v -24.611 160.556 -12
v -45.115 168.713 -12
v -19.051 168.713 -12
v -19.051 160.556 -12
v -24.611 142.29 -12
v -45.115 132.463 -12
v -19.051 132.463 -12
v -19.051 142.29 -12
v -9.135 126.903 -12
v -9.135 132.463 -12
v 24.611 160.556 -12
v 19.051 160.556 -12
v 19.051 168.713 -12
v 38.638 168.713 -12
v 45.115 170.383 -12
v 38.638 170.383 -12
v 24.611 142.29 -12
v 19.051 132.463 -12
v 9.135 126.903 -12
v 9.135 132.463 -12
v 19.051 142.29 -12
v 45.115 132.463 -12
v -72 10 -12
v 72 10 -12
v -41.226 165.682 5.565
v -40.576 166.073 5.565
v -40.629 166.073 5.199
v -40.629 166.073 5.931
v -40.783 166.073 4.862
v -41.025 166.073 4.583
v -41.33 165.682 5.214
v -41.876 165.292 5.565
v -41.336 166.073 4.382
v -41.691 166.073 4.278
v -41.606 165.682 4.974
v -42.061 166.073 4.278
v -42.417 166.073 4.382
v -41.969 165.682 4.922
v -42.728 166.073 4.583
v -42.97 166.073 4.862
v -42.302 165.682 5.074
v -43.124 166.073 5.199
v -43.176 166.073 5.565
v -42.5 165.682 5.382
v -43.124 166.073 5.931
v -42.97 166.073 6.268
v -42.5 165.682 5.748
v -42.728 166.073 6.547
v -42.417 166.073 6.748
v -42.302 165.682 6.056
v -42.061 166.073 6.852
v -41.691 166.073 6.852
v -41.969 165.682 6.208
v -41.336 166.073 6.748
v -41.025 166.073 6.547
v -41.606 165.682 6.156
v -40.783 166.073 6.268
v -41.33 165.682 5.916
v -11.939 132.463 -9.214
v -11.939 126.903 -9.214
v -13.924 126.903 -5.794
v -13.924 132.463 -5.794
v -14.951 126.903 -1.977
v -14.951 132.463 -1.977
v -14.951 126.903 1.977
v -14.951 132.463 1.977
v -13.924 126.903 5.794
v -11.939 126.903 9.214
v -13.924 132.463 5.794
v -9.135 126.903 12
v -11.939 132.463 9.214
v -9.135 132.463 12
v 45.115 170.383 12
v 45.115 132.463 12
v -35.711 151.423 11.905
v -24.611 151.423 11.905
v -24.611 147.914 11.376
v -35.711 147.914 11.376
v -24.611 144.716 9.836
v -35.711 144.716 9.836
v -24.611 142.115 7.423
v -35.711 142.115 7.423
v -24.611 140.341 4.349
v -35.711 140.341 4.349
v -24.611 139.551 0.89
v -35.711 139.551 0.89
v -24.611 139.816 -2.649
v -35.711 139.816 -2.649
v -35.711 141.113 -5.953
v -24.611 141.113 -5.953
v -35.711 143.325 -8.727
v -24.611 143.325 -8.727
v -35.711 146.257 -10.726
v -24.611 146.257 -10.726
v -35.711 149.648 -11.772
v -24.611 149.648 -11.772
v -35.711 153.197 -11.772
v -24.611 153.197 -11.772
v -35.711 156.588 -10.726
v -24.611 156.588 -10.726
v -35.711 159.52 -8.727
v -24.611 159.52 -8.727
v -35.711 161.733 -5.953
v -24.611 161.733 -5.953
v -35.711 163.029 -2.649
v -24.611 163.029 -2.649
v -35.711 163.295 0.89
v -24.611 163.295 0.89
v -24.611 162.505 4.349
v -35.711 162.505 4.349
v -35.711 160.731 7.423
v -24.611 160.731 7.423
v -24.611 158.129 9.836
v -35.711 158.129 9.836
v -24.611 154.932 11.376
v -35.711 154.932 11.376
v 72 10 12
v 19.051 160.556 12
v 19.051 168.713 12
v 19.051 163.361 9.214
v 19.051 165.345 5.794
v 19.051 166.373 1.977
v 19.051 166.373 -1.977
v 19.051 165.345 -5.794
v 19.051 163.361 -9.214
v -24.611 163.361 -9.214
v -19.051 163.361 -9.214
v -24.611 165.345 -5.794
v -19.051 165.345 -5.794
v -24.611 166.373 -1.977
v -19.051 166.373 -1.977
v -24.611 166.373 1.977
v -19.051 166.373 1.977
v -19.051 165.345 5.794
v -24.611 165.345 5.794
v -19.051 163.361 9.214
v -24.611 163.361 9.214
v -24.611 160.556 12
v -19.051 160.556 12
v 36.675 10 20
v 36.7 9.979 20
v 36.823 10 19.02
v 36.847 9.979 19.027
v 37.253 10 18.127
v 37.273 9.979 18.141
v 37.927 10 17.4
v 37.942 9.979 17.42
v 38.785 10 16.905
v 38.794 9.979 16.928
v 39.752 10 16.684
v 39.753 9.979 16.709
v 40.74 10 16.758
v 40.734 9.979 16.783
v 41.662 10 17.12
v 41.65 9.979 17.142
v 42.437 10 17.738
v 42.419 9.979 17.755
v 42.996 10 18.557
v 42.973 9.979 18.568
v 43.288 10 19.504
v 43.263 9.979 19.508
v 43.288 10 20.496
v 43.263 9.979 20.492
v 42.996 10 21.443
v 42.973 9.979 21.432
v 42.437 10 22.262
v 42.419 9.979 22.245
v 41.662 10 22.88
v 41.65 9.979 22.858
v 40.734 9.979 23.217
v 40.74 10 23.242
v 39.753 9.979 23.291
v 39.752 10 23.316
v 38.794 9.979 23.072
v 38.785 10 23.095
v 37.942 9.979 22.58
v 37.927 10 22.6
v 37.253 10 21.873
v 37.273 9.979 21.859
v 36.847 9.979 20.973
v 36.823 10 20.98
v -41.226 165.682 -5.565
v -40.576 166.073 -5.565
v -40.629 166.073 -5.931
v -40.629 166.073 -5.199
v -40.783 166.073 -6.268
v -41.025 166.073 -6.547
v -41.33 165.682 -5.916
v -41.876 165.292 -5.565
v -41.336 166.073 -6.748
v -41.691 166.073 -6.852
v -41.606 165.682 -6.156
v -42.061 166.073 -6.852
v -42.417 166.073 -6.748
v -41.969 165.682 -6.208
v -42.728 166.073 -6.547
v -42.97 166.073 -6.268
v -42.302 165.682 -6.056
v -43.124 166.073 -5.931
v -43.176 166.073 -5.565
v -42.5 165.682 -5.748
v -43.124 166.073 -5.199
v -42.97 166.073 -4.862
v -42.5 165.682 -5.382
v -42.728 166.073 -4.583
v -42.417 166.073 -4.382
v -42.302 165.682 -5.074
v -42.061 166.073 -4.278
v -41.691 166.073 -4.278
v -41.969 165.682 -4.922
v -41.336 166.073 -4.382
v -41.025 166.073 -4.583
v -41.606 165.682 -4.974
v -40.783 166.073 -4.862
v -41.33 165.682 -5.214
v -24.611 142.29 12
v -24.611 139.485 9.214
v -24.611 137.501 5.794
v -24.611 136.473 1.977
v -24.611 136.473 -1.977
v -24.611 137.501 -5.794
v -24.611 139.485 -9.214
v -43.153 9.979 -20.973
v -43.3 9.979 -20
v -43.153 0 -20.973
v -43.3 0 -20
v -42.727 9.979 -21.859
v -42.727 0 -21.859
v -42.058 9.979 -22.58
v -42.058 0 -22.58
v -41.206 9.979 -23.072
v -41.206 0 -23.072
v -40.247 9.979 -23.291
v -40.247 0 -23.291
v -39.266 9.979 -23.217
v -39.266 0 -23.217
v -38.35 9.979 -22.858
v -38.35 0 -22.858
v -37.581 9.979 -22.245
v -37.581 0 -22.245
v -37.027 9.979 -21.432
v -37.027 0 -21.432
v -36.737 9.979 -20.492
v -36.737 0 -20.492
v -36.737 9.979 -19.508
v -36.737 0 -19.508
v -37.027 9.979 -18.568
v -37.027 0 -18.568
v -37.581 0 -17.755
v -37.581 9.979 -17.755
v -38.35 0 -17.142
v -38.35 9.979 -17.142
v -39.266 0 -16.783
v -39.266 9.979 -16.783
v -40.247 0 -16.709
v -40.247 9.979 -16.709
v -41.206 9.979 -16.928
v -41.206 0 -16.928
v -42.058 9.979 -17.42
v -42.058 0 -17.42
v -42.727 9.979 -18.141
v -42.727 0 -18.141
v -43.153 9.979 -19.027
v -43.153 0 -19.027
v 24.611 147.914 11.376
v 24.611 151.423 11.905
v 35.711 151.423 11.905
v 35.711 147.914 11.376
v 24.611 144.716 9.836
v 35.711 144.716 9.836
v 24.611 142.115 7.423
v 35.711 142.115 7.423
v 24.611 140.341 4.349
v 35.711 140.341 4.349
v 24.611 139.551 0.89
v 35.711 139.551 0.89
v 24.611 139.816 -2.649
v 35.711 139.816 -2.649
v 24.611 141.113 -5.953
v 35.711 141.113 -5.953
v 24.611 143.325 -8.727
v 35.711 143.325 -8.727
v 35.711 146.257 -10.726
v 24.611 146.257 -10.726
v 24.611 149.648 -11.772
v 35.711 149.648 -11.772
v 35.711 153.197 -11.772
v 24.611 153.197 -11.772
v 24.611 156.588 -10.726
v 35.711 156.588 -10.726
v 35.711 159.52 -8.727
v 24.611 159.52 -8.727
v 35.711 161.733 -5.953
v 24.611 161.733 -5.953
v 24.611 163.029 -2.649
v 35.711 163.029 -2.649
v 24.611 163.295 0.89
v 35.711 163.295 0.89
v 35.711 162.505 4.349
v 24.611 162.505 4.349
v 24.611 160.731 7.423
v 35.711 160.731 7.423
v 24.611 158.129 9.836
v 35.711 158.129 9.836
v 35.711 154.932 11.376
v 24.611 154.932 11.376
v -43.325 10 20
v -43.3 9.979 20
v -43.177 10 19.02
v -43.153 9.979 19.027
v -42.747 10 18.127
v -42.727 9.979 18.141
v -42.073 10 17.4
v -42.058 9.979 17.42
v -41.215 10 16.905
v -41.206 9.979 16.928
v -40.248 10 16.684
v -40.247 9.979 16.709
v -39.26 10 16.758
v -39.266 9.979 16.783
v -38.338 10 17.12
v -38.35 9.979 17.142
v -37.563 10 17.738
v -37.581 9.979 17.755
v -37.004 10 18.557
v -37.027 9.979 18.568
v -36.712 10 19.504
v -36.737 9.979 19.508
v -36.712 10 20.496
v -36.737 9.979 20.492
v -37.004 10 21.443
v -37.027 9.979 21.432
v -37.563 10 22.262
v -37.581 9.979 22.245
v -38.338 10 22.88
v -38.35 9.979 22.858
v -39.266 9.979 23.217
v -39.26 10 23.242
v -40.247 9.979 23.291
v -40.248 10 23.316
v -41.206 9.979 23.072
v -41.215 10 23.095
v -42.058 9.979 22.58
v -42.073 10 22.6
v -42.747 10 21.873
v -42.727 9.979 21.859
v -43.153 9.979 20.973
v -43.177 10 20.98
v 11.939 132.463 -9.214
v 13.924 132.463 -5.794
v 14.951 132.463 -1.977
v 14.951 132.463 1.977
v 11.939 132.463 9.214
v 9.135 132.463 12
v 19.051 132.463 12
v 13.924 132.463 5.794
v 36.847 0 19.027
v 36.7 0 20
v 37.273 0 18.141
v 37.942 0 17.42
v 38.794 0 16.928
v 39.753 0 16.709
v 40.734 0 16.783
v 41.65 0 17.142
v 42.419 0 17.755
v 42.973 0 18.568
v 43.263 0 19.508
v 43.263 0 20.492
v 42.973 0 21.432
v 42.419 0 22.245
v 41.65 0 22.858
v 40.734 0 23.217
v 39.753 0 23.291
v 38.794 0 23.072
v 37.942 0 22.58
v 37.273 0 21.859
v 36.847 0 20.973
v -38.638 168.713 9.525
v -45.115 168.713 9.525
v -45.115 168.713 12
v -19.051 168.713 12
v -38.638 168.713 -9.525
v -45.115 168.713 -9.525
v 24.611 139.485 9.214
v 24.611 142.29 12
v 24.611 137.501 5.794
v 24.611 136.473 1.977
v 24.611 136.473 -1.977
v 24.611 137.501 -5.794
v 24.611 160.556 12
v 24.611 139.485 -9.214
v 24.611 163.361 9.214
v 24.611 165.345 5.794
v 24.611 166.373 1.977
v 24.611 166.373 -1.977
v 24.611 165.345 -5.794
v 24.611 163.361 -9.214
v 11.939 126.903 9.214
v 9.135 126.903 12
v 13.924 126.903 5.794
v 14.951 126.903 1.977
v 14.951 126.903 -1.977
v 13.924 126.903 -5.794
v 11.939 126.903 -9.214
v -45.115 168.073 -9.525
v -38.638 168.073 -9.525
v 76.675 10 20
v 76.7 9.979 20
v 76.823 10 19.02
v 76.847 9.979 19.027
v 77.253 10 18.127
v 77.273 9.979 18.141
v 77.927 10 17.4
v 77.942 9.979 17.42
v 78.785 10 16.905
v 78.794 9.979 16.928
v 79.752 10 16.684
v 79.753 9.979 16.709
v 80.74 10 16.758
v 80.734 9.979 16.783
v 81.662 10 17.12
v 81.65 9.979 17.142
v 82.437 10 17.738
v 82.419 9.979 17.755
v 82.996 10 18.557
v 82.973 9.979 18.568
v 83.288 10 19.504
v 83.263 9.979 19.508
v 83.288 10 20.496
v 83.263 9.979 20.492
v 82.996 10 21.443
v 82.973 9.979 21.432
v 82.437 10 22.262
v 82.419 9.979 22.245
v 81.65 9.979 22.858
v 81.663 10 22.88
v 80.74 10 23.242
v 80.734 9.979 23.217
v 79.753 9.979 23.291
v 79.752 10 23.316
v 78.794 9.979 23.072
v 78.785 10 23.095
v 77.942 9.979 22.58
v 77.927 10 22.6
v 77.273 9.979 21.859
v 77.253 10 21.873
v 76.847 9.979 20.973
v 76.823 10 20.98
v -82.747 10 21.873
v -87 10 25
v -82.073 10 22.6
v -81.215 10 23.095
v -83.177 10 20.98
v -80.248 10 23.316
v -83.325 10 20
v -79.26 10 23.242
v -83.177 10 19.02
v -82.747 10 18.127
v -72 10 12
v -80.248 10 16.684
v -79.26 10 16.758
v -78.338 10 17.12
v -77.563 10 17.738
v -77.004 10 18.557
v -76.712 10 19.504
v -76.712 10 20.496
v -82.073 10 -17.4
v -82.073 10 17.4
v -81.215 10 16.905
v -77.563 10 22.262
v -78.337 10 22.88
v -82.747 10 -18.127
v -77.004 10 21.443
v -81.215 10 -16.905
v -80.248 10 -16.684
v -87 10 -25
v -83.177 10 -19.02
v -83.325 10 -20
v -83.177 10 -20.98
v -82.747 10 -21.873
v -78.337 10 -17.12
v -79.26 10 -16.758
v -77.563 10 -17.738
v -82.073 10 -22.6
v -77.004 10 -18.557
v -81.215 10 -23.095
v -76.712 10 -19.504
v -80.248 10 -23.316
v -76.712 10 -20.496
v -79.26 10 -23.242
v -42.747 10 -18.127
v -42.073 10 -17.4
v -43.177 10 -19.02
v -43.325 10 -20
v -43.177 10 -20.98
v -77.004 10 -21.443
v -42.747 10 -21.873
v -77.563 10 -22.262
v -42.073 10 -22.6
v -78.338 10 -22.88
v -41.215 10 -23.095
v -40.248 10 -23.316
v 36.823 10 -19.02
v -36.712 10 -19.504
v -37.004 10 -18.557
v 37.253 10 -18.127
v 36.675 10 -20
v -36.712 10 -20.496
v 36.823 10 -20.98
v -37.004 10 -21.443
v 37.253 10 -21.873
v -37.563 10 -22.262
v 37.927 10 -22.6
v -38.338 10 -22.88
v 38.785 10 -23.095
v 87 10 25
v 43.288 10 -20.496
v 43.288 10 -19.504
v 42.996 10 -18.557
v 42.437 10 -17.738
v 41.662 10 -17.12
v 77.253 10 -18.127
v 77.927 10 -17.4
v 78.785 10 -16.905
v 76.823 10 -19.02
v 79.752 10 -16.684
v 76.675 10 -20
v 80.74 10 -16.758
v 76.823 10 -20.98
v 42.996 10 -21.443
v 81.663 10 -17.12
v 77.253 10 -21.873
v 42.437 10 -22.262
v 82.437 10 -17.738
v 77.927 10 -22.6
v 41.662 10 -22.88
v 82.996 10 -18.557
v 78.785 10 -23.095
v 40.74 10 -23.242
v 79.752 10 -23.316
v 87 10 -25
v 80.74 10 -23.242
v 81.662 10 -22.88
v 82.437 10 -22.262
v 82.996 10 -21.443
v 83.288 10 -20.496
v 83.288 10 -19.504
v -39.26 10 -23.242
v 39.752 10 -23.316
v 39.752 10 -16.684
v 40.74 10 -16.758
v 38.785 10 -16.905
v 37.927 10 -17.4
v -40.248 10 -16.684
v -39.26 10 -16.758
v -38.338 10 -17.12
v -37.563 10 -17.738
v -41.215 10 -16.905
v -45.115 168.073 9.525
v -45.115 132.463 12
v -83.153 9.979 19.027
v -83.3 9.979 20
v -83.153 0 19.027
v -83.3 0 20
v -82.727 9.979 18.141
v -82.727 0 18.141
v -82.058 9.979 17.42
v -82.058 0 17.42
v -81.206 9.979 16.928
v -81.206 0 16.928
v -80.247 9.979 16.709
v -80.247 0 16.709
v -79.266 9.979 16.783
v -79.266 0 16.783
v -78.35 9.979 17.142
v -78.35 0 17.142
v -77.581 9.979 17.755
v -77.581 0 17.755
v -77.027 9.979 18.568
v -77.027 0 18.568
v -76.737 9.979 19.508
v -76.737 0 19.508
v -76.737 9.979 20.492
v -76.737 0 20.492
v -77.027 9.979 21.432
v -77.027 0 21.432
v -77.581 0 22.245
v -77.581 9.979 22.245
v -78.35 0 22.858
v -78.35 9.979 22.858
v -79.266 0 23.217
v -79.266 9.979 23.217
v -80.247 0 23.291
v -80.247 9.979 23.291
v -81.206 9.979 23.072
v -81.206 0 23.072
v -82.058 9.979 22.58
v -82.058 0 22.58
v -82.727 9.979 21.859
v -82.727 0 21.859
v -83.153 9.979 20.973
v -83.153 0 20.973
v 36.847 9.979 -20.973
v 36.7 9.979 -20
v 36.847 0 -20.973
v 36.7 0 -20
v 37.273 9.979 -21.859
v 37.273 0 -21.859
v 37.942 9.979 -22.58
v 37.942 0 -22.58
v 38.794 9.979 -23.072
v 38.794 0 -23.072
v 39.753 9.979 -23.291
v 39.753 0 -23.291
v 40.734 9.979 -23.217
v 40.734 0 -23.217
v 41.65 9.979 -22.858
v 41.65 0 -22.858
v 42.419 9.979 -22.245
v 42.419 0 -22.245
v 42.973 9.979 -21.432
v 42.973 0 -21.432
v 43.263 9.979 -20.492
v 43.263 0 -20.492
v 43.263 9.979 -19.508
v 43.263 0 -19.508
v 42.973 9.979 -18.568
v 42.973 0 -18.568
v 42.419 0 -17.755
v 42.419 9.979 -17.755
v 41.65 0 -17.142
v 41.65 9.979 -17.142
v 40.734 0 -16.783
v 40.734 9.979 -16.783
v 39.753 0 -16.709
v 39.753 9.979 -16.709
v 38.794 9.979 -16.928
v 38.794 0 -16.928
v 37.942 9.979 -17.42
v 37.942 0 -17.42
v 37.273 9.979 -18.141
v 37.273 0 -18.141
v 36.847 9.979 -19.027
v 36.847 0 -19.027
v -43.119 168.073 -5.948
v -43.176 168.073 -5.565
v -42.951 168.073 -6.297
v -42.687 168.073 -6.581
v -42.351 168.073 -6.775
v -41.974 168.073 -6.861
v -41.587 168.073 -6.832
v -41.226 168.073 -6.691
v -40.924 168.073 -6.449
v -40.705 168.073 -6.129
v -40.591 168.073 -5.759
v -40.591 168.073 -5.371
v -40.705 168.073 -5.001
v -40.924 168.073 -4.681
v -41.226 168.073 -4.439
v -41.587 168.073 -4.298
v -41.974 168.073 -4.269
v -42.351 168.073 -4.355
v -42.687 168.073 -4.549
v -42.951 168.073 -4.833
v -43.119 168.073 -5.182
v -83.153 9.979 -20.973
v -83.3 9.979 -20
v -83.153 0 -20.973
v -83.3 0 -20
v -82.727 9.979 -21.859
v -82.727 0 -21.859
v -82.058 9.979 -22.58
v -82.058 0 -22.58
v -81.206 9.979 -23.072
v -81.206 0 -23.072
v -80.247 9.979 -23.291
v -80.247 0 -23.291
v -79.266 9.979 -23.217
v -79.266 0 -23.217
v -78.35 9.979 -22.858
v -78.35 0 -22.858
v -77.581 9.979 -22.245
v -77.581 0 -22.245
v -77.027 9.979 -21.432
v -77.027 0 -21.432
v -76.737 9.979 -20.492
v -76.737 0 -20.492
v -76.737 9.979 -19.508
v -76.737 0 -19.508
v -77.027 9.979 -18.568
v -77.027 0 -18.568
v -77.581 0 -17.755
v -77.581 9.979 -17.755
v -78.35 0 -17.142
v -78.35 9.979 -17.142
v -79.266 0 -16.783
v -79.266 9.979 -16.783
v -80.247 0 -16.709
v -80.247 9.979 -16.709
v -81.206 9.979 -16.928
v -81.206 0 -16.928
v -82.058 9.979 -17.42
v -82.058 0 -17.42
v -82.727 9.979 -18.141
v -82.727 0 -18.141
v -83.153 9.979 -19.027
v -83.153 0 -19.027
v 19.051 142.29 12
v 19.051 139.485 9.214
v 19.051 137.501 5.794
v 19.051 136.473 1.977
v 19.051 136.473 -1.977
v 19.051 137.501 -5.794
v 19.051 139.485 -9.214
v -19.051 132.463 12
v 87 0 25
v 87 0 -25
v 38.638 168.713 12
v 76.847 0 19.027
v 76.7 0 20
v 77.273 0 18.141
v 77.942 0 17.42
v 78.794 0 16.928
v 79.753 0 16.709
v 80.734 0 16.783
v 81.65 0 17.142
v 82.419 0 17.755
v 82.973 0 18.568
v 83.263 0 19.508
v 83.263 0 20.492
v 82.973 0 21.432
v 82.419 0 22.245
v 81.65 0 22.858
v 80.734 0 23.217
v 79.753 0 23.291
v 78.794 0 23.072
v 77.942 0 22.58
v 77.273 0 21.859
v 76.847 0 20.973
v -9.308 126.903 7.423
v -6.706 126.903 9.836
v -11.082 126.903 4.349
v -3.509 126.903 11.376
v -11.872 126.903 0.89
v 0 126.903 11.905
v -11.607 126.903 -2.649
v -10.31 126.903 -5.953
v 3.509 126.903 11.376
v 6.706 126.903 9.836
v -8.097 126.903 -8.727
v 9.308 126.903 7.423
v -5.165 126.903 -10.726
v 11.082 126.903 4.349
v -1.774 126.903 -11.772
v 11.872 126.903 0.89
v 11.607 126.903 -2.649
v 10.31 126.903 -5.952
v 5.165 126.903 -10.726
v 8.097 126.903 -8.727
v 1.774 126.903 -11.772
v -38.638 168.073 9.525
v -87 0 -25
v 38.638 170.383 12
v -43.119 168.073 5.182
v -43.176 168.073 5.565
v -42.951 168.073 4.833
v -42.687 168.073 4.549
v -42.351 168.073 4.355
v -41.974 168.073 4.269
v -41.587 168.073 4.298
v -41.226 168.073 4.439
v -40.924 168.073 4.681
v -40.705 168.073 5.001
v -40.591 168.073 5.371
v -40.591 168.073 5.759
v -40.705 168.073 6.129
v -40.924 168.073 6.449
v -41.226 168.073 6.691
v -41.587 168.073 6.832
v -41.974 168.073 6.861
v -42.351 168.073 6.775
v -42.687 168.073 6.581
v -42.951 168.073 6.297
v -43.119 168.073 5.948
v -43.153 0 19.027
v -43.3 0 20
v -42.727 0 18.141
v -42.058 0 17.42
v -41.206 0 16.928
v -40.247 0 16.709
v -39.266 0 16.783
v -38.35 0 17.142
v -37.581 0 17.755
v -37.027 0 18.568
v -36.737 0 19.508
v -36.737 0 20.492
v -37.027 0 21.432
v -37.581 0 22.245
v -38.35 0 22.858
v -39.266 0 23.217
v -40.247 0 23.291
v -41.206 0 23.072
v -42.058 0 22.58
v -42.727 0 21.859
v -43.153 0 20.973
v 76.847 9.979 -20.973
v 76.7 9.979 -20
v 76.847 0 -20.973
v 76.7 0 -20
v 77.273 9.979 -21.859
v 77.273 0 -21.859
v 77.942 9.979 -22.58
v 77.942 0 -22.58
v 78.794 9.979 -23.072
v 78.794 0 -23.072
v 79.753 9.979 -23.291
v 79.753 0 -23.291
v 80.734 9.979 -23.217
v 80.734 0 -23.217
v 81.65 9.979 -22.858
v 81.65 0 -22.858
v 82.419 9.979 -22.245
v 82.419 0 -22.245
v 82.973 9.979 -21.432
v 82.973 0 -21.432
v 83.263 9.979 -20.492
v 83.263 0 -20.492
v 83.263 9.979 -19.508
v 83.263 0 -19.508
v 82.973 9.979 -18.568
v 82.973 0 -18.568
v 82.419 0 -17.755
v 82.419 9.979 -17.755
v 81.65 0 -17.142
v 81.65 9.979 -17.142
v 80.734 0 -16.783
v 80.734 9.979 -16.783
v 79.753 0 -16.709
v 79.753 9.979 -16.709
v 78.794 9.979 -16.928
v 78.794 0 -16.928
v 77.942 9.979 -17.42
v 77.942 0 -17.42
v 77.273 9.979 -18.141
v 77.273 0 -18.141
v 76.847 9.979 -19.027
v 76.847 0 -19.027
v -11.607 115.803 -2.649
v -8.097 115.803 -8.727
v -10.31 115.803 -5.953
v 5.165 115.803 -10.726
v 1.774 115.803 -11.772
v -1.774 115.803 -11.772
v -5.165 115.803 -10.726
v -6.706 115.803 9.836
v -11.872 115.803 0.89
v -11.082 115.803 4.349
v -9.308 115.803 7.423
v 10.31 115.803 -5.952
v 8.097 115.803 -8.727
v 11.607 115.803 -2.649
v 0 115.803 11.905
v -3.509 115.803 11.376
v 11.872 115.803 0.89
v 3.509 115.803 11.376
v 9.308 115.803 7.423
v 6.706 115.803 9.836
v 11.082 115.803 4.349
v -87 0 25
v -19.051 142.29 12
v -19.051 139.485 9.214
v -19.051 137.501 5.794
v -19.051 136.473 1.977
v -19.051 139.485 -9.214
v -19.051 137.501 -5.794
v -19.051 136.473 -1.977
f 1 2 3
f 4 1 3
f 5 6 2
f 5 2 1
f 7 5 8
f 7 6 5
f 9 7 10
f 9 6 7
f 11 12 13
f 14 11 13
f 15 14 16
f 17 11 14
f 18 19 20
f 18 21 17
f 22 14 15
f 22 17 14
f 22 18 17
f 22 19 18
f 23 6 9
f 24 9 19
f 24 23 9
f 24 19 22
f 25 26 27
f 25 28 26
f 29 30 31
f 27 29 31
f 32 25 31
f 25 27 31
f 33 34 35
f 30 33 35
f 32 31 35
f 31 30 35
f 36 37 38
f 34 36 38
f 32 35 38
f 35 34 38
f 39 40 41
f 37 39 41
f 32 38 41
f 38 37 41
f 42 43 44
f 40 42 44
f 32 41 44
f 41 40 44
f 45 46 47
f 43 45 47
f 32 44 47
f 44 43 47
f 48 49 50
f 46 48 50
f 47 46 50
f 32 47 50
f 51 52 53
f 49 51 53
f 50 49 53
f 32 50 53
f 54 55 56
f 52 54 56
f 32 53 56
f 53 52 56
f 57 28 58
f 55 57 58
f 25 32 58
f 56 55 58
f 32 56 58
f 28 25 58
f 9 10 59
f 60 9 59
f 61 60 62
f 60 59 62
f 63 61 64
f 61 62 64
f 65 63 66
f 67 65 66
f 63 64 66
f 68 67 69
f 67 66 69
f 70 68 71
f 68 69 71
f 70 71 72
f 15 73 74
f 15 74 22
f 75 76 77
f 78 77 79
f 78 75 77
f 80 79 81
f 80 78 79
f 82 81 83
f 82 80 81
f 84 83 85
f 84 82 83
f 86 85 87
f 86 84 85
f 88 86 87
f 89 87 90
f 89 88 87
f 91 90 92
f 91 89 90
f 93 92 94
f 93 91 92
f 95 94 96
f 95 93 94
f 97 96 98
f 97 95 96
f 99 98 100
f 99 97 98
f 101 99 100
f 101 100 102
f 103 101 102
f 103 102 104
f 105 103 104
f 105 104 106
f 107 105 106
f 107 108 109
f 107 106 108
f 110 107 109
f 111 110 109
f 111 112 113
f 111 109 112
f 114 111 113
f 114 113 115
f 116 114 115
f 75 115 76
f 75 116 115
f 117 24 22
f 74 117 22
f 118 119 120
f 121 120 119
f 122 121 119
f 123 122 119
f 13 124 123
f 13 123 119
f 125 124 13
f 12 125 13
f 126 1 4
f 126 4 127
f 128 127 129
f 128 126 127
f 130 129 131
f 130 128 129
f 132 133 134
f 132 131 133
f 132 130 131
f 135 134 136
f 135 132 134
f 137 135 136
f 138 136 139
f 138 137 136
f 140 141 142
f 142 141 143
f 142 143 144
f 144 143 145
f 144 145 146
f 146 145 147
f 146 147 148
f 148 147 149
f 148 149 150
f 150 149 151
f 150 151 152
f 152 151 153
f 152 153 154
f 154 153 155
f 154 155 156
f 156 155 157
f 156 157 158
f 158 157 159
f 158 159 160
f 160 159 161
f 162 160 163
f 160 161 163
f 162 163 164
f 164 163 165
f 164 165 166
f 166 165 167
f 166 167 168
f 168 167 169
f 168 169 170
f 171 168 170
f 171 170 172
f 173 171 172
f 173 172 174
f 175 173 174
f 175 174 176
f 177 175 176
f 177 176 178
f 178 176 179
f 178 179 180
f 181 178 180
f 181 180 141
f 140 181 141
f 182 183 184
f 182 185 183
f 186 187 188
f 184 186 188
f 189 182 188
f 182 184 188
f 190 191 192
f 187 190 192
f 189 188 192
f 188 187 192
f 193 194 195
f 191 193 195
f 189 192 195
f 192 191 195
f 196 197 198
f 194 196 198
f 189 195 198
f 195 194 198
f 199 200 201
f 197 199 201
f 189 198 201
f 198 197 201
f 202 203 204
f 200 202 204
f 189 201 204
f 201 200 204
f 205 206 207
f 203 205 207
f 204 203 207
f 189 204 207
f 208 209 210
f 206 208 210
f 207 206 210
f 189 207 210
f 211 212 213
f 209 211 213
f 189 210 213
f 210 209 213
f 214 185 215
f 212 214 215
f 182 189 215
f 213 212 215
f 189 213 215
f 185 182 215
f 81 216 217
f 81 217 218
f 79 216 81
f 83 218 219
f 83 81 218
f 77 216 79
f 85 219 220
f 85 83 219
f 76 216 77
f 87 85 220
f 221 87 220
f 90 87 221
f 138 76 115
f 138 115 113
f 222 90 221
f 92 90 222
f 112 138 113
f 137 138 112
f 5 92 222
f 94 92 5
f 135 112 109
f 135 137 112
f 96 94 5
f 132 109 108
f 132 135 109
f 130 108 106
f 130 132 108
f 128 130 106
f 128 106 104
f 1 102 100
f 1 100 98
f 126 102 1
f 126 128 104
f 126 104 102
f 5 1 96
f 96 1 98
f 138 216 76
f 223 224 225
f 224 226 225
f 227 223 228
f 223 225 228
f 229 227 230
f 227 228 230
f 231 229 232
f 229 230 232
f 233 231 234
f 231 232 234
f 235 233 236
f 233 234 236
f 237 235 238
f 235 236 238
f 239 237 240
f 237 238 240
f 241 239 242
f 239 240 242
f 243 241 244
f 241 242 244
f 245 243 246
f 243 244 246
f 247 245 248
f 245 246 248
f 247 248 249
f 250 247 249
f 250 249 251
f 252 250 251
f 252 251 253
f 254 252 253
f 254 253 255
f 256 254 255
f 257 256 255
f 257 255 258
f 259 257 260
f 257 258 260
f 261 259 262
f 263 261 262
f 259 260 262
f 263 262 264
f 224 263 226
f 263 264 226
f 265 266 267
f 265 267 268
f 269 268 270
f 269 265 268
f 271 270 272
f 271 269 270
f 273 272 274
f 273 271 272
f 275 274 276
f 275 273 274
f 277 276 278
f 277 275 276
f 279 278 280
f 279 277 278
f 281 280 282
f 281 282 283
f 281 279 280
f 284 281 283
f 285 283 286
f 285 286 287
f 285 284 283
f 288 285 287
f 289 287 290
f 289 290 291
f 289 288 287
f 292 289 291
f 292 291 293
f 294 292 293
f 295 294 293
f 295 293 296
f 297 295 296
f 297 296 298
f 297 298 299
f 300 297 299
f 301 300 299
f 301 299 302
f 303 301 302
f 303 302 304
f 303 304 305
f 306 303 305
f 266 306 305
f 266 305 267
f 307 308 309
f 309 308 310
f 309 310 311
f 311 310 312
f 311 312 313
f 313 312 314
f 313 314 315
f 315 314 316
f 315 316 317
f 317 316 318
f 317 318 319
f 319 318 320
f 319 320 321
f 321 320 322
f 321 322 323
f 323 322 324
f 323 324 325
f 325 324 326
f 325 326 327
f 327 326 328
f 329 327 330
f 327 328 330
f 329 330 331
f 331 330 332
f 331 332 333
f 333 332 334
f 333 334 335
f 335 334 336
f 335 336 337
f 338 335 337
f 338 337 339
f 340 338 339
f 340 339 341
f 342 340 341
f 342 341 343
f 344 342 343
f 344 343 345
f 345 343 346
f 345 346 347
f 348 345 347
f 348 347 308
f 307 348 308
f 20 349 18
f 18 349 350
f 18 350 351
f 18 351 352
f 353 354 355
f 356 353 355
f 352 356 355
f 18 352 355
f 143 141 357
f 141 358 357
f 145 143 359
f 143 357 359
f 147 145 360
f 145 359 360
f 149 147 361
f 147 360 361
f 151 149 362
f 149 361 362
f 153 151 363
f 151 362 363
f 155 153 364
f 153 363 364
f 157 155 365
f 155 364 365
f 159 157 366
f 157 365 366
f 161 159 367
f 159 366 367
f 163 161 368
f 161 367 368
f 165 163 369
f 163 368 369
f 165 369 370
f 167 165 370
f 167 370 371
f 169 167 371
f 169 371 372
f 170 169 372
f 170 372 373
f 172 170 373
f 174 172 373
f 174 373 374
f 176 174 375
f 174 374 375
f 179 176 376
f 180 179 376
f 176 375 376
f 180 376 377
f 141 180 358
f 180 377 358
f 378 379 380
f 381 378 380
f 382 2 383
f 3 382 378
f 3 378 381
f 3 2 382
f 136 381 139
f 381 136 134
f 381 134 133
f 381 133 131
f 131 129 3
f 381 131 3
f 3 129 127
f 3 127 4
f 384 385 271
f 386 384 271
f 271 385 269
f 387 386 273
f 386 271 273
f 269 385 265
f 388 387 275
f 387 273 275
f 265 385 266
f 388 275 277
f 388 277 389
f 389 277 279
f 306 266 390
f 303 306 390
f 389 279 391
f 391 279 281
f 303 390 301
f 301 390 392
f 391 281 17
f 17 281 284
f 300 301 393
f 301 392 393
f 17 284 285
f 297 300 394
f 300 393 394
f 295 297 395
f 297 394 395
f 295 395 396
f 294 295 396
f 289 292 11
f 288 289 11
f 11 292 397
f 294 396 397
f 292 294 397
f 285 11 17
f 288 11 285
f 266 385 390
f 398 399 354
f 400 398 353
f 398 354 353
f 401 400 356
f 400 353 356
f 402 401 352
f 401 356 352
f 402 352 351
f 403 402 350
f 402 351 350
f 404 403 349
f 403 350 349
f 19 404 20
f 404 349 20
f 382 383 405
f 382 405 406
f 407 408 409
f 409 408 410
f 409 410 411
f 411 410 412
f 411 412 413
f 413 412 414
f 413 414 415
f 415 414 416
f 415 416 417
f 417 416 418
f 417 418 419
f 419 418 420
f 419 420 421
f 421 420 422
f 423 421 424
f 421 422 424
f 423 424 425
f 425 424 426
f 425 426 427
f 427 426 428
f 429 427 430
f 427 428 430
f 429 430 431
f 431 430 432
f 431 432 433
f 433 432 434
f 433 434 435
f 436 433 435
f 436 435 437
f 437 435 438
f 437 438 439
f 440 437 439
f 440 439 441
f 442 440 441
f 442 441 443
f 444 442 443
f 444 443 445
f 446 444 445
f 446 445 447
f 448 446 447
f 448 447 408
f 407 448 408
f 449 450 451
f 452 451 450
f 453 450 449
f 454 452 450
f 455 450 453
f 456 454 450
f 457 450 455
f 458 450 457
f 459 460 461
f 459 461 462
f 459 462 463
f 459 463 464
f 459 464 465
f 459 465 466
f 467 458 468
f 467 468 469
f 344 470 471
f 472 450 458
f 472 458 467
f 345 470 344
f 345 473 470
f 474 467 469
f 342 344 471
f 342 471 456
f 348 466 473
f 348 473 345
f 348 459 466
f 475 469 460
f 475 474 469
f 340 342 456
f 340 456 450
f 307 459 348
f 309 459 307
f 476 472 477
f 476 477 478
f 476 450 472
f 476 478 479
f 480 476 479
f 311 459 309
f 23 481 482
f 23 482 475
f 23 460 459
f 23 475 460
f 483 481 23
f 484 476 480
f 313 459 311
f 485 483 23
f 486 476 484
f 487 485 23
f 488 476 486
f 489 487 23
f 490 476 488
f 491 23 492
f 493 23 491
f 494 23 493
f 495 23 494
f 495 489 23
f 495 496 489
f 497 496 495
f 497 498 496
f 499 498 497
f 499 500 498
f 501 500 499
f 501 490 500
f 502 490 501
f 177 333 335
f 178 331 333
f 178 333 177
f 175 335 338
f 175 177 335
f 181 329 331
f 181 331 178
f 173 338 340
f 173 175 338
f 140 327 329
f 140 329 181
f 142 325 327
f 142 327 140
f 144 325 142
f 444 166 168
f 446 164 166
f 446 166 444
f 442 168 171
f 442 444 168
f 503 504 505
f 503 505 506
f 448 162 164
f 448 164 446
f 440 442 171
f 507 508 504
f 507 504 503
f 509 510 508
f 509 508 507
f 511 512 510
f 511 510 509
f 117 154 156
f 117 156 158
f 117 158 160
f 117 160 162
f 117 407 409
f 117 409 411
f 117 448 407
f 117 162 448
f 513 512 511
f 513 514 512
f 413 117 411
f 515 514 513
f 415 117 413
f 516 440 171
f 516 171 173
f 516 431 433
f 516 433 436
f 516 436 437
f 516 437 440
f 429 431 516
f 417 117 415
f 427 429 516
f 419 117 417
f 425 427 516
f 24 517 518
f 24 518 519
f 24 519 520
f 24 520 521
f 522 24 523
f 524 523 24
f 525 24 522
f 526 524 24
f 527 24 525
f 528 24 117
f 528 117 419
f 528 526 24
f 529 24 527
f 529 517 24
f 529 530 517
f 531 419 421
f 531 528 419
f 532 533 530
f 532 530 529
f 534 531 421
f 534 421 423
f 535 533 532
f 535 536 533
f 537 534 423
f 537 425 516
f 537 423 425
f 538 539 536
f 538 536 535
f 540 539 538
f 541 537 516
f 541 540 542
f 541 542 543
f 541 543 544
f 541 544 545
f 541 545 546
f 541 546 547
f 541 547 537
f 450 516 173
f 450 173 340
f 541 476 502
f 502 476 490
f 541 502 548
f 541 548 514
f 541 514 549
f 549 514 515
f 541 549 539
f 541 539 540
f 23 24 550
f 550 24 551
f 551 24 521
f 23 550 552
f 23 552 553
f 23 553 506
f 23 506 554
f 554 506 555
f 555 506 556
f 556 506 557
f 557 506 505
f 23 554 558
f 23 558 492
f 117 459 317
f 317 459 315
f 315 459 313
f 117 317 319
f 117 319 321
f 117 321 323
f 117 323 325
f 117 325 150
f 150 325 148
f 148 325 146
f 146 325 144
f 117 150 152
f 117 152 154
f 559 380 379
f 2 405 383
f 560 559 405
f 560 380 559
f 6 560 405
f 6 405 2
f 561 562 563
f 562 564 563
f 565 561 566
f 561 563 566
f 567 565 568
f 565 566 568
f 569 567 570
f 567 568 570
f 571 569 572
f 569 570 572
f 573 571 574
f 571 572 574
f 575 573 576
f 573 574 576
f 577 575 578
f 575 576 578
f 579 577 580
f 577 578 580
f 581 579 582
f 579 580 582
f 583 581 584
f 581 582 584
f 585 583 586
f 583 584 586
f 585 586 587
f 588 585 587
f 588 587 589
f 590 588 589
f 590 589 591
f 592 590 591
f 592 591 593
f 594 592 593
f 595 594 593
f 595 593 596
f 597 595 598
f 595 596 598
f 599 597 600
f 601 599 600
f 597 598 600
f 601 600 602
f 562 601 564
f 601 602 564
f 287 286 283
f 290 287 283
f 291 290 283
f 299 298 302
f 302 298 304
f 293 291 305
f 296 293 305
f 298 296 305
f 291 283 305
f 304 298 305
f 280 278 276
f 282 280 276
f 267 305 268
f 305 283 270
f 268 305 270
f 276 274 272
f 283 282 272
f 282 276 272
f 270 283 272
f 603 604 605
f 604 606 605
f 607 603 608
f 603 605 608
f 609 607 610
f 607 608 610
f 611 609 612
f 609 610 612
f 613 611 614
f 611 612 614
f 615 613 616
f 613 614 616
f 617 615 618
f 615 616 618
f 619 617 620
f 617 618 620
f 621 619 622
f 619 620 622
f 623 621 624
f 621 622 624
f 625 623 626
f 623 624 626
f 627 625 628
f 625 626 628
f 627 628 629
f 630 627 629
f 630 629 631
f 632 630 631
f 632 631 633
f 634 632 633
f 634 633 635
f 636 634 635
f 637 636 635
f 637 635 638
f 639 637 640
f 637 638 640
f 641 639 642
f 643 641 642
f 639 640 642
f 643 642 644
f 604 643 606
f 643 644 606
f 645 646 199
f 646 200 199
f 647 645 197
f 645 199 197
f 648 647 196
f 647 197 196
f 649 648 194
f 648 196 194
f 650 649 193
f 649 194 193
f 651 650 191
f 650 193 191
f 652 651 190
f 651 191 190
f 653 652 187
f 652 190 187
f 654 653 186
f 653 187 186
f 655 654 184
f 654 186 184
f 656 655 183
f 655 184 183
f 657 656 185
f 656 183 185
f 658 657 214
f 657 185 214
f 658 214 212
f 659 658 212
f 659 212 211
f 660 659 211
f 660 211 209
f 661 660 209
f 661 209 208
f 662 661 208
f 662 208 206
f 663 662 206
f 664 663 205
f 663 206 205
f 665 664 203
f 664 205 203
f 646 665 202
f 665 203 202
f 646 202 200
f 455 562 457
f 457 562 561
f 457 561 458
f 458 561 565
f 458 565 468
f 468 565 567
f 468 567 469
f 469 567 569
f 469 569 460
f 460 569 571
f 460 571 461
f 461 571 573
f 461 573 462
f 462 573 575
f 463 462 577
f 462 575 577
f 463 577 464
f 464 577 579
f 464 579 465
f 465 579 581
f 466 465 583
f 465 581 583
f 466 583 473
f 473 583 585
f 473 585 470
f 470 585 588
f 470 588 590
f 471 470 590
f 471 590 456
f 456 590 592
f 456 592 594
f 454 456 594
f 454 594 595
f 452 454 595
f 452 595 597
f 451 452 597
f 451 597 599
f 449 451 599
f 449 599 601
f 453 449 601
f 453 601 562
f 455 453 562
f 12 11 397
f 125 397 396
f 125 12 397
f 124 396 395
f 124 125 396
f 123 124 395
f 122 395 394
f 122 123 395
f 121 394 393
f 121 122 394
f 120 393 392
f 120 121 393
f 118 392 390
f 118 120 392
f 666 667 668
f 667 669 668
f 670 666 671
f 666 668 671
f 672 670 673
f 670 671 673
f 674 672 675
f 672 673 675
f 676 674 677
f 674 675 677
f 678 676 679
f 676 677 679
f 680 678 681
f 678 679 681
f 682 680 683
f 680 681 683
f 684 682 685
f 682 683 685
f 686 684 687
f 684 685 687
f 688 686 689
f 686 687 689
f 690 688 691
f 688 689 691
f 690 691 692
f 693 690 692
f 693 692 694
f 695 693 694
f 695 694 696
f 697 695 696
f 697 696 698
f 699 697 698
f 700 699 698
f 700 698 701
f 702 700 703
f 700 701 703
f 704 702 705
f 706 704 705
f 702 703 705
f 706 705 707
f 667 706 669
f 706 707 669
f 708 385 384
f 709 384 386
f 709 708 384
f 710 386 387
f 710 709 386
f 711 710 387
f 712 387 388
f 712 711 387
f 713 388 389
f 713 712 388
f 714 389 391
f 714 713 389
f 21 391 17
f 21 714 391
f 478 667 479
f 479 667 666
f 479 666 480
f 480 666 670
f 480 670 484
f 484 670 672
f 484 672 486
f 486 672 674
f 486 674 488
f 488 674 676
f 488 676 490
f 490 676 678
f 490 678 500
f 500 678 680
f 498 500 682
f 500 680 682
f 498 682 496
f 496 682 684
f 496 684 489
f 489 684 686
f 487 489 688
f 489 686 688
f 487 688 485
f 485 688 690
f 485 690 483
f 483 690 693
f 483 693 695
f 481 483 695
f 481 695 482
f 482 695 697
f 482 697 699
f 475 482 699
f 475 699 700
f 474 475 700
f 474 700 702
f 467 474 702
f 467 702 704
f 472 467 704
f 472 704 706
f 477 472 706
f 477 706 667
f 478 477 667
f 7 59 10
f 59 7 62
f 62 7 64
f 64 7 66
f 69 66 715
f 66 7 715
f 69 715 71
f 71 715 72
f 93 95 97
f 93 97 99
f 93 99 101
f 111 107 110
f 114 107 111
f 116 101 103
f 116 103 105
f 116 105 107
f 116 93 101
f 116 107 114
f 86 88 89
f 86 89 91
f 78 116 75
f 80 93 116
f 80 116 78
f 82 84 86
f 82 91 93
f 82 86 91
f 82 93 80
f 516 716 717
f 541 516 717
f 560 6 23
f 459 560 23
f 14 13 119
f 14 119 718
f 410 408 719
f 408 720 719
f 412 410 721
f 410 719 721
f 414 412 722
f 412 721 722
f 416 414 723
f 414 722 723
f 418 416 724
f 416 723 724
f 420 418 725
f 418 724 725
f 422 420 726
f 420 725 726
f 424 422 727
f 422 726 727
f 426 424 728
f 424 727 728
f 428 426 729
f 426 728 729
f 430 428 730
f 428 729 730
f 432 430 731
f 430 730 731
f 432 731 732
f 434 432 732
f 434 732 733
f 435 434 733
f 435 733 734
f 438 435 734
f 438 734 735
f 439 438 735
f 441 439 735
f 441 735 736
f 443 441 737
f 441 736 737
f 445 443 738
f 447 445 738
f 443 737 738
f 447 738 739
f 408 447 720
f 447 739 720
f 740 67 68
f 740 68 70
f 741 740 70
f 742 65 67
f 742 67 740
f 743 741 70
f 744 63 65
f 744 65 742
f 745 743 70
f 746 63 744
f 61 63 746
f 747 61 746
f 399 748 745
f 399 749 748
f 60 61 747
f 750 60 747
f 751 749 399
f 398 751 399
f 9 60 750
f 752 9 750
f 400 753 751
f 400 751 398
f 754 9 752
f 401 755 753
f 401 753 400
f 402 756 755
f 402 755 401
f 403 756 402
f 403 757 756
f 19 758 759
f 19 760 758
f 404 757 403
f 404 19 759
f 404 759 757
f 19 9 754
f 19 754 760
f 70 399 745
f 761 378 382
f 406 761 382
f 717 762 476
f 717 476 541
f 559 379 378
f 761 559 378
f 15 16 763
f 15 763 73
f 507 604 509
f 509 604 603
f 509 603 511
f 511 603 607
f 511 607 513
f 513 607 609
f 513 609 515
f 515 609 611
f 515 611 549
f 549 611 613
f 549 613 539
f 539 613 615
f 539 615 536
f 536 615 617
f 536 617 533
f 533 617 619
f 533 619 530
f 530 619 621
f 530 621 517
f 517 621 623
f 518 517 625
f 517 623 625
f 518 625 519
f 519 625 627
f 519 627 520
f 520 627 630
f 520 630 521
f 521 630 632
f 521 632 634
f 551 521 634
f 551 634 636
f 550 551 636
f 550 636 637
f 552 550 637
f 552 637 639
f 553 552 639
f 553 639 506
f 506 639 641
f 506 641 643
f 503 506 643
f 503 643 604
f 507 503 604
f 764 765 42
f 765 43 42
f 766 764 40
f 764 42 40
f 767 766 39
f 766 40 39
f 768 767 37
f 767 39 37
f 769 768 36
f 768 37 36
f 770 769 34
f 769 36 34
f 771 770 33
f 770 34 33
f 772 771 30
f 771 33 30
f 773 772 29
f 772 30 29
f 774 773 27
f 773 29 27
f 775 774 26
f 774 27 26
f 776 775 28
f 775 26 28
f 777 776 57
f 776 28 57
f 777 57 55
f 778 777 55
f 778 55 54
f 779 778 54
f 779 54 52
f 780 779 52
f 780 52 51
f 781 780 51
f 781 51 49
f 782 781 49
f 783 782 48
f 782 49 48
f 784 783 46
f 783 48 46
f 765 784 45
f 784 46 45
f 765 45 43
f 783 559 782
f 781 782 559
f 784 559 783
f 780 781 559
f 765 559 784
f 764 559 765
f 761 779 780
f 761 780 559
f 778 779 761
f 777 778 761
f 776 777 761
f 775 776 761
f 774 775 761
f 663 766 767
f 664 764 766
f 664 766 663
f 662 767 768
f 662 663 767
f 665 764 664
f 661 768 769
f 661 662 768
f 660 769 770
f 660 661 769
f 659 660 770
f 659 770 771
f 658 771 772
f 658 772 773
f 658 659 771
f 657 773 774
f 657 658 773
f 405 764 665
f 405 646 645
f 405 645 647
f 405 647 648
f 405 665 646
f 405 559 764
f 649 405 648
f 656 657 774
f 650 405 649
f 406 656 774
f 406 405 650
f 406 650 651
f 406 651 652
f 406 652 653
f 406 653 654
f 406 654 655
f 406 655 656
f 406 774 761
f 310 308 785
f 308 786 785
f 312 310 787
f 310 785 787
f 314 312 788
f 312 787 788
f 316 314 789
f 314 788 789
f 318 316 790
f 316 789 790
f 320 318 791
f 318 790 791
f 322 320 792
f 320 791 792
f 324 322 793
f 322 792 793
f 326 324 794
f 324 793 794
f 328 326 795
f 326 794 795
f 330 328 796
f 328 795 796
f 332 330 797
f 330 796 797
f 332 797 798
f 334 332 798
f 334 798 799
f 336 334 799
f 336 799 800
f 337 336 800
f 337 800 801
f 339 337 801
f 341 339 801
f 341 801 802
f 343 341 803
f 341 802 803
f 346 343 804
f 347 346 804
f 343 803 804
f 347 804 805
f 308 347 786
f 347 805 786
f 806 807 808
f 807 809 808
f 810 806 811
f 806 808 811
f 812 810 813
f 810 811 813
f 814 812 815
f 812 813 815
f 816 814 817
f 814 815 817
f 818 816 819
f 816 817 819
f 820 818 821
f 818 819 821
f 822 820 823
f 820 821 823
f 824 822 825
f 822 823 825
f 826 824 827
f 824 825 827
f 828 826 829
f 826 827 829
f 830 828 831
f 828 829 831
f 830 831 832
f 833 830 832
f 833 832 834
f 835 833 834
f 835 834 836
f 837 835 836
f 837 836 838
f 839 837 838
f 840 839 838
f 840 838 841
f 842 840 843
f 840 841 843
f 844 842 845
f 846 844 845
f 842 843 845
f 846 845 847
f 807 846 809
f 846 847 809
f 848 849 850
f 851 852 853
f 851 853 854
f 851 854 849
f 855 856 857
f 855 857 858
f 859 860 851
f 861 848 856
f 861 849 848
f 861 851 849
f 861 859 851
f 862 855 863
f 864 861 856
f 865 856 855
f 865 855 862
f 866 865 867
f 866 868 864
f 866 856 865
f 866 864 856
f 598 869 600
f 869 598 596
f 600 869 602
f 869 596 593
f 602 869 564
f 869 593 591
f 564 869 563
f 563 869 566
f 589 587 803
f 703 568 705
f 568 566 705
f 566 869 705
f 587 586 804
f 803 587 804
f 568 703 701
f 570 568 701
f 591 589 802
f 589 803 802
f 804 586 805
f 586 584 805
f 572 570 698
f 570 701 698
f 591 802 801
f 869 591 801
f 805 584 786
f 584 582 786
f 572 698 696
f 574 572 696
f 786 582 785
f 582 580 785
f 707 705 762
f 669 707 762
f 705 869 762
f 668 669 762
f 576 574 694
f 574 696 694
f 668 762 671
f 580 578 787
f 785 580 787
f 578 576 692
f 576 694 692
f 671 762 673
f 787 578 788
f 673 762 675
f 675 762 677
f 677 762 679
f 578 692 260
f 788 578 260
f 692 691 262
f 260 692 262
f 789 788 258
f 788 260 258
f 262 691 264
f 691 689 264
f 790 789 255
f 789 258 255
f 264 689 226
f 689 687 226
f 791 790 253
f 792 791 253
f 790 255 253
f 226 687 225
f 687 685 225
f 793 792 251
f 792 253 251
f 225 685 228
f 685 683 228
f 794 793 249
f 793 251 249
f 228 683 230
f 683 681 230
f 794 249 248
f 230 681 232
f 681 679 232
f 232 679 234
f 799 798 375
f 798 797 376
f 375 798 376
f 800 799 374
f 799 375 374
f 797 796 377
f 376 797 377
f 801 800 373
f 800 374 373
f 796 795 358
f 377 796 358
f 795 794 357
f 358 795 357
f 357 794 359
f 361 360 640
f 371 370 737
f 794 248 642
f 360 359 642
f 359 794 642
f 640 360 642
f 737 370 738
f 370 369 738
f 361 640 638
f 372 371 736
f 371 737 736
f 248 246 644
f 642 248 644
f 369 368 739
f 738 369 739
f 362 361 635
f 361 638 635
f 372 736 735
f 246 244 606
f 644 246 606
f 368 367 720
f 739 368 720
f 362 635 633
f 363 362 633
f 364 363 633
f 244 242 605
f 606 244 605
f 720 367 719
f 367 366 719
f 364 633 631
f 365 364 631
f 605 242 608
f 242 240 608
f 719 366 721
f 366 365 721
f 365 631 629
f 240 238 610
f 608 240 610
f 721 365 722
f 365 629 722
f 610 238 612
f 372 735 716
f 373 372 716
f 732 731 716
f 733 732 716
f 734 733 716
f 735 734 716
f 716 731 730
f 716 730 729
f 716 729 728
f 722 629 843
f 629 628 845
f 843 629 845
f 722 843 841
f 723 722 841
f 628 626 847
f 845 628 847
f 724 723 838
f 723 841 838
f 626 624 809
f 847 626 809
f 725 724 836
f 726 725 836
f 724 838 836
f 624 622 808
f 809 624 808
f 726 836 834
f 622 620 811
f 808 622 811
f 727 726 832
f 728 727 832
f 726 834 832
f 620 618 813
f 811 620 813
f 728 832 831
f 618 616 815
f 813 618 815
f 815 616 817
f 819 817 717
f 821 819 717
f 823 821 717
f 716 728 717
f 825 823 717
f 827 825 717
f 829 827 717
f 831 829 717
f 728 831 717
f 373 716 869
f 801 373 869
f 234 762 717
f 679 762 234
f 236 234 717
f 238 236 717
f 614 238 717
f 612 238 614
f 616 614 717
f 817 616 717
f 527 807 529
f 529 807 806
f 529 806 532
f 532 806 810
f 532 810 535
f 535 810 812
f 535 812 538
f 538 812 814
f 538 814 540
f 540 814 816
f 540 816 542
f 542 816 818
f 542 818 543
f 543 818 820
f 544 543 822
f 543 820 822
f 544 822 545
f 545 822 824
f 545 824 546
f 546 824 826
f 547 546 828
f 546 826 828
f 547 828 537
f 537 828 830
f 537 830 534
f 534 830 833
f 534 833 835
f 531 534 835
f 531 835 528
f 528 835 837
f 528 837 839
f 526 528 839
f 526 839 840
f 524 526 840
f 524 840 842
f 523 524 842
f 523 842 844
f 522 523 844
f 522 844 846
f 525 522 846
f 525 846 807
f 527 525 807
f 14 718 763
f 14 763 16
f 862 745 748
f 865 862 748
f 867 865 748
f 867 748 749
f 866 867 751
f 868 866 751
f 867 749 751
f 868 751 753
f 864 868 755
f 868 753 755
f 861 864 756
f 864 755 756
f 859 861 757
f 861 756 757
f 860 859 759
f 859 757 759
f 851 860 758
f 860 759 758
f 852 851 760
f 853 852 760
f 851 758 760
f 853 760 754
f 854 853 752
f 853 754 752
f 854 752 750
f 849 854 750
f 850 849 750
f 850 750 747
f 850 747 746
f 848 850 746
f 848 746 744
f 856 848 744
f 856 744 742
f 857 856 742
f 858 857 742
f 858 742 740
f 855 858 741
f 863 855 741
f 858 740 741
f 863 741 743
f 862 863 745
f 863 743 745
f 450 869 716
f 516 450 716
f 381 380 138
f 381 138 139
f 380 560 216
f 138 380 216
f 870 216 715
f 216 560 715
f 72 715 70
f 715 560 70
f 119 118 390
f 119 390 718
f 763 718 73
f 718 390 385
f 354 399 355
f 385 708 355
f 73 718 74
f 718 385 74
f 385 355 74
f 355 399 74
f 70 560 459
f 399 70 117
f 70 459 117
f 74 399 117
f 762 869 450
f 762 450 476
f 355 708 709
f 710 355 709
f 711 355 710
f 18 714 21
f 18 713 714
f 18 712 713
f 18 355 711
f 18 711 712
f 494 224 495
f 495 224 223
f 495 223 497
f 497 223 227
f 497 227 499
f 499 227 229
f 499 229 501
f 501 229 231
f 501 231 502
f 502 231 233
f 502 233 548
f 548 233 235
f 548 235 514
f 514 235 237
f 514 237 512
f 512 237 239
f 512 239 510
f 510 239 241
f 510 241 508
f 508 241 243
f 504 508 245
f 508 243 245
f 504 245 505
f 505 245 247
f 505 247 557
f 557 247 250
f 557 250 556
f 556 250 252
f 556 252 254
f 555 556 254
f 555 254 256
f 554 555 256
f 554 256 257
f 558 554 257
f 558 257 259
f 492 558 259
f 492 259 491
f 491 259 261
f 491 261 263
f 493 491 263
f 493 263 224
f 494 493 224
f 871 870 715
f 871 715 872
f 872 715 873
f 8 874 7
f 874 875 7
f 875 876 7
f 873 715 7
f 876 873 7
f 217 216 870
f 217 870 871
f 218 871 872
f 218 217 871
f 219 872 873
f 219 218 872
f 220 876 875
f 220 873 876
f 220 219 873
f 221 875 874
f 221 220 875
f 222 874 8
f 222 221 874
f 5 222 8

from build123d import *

# Parameters (mm, degrees)
SKETCH1_W                      = 174
SKETCH1_H                      = 50
BOSS_EXTRUDE1_DEPTH            = 10
M6_CLEARANCE_HOLE1_D           = 6.6
M6_CLEARANCE_HOLE1_CSINK_D     = 6.65
M6_CLEARANCE_HOLE1_CSINK_ANGLE = 100
BOSS_EXTRUDE2_DEPTH            = 12
BOSS_EXTRUDE2_DEPTH_BACK       = 12
CUT_EXTRUDE1_REACH             = 215.496
SKETCH7_W                      = 90.229970364
SKETCH7_H                      = 70
SKETCH8_R                      = 15.08125
CUT_EXTRUDE2_DEPTH             = 5.56
SKETCH9_R                      = 11.905
CUT_EXTRUDE3_DEPTH             = 11.1
SKETCH10_W                     = 26.063735182
SKETCH10_H                     = 24
BOSS_EXTRUDE3_DEPTH            = 36.25
CUT_EXTRUDE4_START             = -24.61125
SKETCH11_R                     = 15.08
CUT_EXTRUDE4_DEPTH             = 49.2225
CUT_EXTRUDE5_DEPTH             = 35.71125
CUT_EXTRUDE5_DEPTH_BACK        = 35.71125
SKETCH12_R                     = 11.905
SKETCH13_W                     = 6.477
SKETCH13_H                     = 19.05
CUT_EXTRUDE6_DEPTH             = 0.64
M2_CLEARANCE_HOLE1_D           = 2.6
M2_CLEARANCE_HOLE1_DEPTH       = 2
M2_CLEARANCE_HOLE1_TIP         = 0.781118805
SKETCH16_W                     = 6.477
SKETCH16_H                     = 24
BOSS_EXTRUDE4_DEPTH            = 1.67


with BuildPart() as part:
    # Sketch1 → Boss-Extrude1 (new body)
    with BuildSketch(Plane(origin=(0, 0, 0), x_dir=(1, 0, 0), z_dir=(0, 1, 0))):
        Rectangle(SKETCH1_W, SKETCH1_H)
    extrude(amount=BOSS_EXTRUDE1_DEPTH)

    # M6 Clearance Hole1 (through all)
    with Locations(Plane(origin=(0, 10, 0), x_dir=(1, 0, 0), z_dir=(0, 1, 0))):
        with Locations((-80, 20), (-40, 20), (-80, -20), (-40, -20), (40, 20), (80, 20), (40, -20), (80, -20)):
            CounterSinkHole(M6_CLEARANCE_HOLE1_D / 2, M6_CLEARANCE_HOLE1_CSINK_D / 2, counter_sink_angle=M6_CLEARANCE_HOLE1_CSINK_ANGLE)

    # Sketch6 → Boss-Extrude2 (add, two sides: drawn at the far end of the back side and taken through both)
    with BuildSketch(Plane.XY.offset(-BOSS_EXTRUDE2_DEPTH_BACK)):
        with BuildLine():
            Line((-72, 10), (72, 10))
            Line((72, 10), (39.069577731, 160))
            ThreePointArc((39.069577731, 160), (0, 191.422815383), (-39.069577731, 160))
            Line((-39.069577731, 160), (-72, 10))
        make_face()
    extrude(amount=BOSS_EXTRUDE2_DEPTH + BOSS_EXTRUDE2_DEPTH_BACK)

    # Sketch7 → Cut-Extrude1 (cut, up to next)
    with BuildSketch(Plane.XY.offset(12), mode=Mode.PRIVATE) as cut_extrude1_sk1:
        with Locations((0, 167.46281538)):
            Rectangle(SKETCH7_W, SKETCH7_H)
    cut_extrude1_tool1 = extrude(cut_extrude1_sk1.sketch, amount=-CUT_EXTRUDE1_REACH, mode=Mode.PRIVATE) & part.part
    add(cut_extrude1_tool1.solids().sort_by_distance((0, 167.462815, 12))[0], mode=Mode.SUBTRACT)

    # Sketch8 → Cut-Extrude2 (cut)
    with BuildSketch(Plane(origin=(0, 132.46281538, 0), x_dir=(1, 0, 0), z_dir=(0, 1, 0))):
        Circle(SKETCH8_R)
    extrude(amount=-CUT_EXTRUDE2_DEPTH, mode=Mode.SUBTRACT)

    # Sketch9 → Cut-Extrude3 (cut)
    with BuildSketch(Plane(origin=(0, 126.90281538, 0), x_dir=(1, 0, 0), z_dir=(0, 1, 0))):
        with Locations(Location((0, 0, 0), (0, 0, 270))):
            Circle(SKETCH9_R)
    extrude(amount=-CUT_EXTRUDE3_DEPTH, mode=Mode.SUBTRACT)

    # Sketch10 → Boss-Extrude3 (add)
    with BuildSketch(Plane(origin=(0, 132.46281538, 0), x_dir=(1, 0, 0), z_dir=(0, 1, 0))):
        with Locations((-32.083117591, 0)):
            Rectangle(SKETCH10_W, SKETCH10_H)
        with Locations((32.083117591, 0)):
            Rectangle(SKETCH10_W, SKETCH10_H)
    extrude(amount=BOSS_EXTRUDE3_DEPTH)

    # Sketch11 → Cut-Extrude4 (cut)
    with BuildSketch(Plane(origin=(0, 0, 0), x_dir=(0, 0, -1), z_dir=(1, 0, 0)).offset(CUT_EXTRUDE4_START)):
        with Locations((0, 151.42281538)):
            Circle(SKETCH11_R)
    extrude(amount=CUT_EXTRUDE4_DEPTH, mode=Mode.SUBTRACT)

    # Sketch12 → Cut-Extrude5 (cut, two sides: drawn at the far end of the back side and taken through both)
    with BuildSketch(Plane(origin=(0, 0, 0), x_dir=(0, 0, -1), z_dir=(1, 0, 0)).offset(-CUT_EXTRUDE5_DEPTH_BACK)):
        with Locations(Location((0, 151.42281538, 0), (0, 0, 180))):
            Circle(SKETCH12_R)
    extrude(amount=CUT_EXTRUDE5_DEPTH + CUT_EXTRUDE5_DEPTH_BACK, mode=Mode.SUBTRACT)

    # Sketch13 → Cut-Extrude6 (cut)
    with BuildSketch(Plane(origin=(0, 168.71281538, 0), x_dir=(1, 0, 0), z_dir=(0, 1, 0))):
        with Locations((-41.876485182, 0)):
            Rectangle(SKETCH13_W, SKETCH13_H)
    extrude(amount=-CUT_EXTRUDE6_DEPTH, mode=Mode.SUBTRACT)

    # M2 Clearance Hole1
    with Locations(Plane(origin=(0, 168.07281538, 0), x_dir=(1, 0, 0), z_dir=(0, 1, 0))):
        with Locations((-41.876485182, 5.565), (-41.876485182, -5.565)):
            Hole(M2_CLEARANCE_HOLE1_D / 2, depth=M2_CLEARANCE_HOLE1_DEPTH)
            with Locations((0, 0, -(M2_CLEARANCE_HOLE1_DEPTH + M2_CLEARANCE_HOLE1_TIP / 2))):  # 118° drill point
                Cone(0, M2_CLEARANCE_HOLE1_D / 2, M2_CLEARANCE_HOLE1_TIP, mode=Mode.SUBTRACT)

    # Sketch16 → Boss-Extrude4 (add)
    with BuildSketch(Plane(origin=(0, 168.71281538, 0), x_dir=(1, 0, 0), z_dir=(0, 1, 0))):
        with Locations((41.876485182, 0)):
            Rectangle(SKETCH16_W, SKETCH16_H)
    extrude(amount=BOSS_EXTRUDE4_DEPTH)


solid = part.part
